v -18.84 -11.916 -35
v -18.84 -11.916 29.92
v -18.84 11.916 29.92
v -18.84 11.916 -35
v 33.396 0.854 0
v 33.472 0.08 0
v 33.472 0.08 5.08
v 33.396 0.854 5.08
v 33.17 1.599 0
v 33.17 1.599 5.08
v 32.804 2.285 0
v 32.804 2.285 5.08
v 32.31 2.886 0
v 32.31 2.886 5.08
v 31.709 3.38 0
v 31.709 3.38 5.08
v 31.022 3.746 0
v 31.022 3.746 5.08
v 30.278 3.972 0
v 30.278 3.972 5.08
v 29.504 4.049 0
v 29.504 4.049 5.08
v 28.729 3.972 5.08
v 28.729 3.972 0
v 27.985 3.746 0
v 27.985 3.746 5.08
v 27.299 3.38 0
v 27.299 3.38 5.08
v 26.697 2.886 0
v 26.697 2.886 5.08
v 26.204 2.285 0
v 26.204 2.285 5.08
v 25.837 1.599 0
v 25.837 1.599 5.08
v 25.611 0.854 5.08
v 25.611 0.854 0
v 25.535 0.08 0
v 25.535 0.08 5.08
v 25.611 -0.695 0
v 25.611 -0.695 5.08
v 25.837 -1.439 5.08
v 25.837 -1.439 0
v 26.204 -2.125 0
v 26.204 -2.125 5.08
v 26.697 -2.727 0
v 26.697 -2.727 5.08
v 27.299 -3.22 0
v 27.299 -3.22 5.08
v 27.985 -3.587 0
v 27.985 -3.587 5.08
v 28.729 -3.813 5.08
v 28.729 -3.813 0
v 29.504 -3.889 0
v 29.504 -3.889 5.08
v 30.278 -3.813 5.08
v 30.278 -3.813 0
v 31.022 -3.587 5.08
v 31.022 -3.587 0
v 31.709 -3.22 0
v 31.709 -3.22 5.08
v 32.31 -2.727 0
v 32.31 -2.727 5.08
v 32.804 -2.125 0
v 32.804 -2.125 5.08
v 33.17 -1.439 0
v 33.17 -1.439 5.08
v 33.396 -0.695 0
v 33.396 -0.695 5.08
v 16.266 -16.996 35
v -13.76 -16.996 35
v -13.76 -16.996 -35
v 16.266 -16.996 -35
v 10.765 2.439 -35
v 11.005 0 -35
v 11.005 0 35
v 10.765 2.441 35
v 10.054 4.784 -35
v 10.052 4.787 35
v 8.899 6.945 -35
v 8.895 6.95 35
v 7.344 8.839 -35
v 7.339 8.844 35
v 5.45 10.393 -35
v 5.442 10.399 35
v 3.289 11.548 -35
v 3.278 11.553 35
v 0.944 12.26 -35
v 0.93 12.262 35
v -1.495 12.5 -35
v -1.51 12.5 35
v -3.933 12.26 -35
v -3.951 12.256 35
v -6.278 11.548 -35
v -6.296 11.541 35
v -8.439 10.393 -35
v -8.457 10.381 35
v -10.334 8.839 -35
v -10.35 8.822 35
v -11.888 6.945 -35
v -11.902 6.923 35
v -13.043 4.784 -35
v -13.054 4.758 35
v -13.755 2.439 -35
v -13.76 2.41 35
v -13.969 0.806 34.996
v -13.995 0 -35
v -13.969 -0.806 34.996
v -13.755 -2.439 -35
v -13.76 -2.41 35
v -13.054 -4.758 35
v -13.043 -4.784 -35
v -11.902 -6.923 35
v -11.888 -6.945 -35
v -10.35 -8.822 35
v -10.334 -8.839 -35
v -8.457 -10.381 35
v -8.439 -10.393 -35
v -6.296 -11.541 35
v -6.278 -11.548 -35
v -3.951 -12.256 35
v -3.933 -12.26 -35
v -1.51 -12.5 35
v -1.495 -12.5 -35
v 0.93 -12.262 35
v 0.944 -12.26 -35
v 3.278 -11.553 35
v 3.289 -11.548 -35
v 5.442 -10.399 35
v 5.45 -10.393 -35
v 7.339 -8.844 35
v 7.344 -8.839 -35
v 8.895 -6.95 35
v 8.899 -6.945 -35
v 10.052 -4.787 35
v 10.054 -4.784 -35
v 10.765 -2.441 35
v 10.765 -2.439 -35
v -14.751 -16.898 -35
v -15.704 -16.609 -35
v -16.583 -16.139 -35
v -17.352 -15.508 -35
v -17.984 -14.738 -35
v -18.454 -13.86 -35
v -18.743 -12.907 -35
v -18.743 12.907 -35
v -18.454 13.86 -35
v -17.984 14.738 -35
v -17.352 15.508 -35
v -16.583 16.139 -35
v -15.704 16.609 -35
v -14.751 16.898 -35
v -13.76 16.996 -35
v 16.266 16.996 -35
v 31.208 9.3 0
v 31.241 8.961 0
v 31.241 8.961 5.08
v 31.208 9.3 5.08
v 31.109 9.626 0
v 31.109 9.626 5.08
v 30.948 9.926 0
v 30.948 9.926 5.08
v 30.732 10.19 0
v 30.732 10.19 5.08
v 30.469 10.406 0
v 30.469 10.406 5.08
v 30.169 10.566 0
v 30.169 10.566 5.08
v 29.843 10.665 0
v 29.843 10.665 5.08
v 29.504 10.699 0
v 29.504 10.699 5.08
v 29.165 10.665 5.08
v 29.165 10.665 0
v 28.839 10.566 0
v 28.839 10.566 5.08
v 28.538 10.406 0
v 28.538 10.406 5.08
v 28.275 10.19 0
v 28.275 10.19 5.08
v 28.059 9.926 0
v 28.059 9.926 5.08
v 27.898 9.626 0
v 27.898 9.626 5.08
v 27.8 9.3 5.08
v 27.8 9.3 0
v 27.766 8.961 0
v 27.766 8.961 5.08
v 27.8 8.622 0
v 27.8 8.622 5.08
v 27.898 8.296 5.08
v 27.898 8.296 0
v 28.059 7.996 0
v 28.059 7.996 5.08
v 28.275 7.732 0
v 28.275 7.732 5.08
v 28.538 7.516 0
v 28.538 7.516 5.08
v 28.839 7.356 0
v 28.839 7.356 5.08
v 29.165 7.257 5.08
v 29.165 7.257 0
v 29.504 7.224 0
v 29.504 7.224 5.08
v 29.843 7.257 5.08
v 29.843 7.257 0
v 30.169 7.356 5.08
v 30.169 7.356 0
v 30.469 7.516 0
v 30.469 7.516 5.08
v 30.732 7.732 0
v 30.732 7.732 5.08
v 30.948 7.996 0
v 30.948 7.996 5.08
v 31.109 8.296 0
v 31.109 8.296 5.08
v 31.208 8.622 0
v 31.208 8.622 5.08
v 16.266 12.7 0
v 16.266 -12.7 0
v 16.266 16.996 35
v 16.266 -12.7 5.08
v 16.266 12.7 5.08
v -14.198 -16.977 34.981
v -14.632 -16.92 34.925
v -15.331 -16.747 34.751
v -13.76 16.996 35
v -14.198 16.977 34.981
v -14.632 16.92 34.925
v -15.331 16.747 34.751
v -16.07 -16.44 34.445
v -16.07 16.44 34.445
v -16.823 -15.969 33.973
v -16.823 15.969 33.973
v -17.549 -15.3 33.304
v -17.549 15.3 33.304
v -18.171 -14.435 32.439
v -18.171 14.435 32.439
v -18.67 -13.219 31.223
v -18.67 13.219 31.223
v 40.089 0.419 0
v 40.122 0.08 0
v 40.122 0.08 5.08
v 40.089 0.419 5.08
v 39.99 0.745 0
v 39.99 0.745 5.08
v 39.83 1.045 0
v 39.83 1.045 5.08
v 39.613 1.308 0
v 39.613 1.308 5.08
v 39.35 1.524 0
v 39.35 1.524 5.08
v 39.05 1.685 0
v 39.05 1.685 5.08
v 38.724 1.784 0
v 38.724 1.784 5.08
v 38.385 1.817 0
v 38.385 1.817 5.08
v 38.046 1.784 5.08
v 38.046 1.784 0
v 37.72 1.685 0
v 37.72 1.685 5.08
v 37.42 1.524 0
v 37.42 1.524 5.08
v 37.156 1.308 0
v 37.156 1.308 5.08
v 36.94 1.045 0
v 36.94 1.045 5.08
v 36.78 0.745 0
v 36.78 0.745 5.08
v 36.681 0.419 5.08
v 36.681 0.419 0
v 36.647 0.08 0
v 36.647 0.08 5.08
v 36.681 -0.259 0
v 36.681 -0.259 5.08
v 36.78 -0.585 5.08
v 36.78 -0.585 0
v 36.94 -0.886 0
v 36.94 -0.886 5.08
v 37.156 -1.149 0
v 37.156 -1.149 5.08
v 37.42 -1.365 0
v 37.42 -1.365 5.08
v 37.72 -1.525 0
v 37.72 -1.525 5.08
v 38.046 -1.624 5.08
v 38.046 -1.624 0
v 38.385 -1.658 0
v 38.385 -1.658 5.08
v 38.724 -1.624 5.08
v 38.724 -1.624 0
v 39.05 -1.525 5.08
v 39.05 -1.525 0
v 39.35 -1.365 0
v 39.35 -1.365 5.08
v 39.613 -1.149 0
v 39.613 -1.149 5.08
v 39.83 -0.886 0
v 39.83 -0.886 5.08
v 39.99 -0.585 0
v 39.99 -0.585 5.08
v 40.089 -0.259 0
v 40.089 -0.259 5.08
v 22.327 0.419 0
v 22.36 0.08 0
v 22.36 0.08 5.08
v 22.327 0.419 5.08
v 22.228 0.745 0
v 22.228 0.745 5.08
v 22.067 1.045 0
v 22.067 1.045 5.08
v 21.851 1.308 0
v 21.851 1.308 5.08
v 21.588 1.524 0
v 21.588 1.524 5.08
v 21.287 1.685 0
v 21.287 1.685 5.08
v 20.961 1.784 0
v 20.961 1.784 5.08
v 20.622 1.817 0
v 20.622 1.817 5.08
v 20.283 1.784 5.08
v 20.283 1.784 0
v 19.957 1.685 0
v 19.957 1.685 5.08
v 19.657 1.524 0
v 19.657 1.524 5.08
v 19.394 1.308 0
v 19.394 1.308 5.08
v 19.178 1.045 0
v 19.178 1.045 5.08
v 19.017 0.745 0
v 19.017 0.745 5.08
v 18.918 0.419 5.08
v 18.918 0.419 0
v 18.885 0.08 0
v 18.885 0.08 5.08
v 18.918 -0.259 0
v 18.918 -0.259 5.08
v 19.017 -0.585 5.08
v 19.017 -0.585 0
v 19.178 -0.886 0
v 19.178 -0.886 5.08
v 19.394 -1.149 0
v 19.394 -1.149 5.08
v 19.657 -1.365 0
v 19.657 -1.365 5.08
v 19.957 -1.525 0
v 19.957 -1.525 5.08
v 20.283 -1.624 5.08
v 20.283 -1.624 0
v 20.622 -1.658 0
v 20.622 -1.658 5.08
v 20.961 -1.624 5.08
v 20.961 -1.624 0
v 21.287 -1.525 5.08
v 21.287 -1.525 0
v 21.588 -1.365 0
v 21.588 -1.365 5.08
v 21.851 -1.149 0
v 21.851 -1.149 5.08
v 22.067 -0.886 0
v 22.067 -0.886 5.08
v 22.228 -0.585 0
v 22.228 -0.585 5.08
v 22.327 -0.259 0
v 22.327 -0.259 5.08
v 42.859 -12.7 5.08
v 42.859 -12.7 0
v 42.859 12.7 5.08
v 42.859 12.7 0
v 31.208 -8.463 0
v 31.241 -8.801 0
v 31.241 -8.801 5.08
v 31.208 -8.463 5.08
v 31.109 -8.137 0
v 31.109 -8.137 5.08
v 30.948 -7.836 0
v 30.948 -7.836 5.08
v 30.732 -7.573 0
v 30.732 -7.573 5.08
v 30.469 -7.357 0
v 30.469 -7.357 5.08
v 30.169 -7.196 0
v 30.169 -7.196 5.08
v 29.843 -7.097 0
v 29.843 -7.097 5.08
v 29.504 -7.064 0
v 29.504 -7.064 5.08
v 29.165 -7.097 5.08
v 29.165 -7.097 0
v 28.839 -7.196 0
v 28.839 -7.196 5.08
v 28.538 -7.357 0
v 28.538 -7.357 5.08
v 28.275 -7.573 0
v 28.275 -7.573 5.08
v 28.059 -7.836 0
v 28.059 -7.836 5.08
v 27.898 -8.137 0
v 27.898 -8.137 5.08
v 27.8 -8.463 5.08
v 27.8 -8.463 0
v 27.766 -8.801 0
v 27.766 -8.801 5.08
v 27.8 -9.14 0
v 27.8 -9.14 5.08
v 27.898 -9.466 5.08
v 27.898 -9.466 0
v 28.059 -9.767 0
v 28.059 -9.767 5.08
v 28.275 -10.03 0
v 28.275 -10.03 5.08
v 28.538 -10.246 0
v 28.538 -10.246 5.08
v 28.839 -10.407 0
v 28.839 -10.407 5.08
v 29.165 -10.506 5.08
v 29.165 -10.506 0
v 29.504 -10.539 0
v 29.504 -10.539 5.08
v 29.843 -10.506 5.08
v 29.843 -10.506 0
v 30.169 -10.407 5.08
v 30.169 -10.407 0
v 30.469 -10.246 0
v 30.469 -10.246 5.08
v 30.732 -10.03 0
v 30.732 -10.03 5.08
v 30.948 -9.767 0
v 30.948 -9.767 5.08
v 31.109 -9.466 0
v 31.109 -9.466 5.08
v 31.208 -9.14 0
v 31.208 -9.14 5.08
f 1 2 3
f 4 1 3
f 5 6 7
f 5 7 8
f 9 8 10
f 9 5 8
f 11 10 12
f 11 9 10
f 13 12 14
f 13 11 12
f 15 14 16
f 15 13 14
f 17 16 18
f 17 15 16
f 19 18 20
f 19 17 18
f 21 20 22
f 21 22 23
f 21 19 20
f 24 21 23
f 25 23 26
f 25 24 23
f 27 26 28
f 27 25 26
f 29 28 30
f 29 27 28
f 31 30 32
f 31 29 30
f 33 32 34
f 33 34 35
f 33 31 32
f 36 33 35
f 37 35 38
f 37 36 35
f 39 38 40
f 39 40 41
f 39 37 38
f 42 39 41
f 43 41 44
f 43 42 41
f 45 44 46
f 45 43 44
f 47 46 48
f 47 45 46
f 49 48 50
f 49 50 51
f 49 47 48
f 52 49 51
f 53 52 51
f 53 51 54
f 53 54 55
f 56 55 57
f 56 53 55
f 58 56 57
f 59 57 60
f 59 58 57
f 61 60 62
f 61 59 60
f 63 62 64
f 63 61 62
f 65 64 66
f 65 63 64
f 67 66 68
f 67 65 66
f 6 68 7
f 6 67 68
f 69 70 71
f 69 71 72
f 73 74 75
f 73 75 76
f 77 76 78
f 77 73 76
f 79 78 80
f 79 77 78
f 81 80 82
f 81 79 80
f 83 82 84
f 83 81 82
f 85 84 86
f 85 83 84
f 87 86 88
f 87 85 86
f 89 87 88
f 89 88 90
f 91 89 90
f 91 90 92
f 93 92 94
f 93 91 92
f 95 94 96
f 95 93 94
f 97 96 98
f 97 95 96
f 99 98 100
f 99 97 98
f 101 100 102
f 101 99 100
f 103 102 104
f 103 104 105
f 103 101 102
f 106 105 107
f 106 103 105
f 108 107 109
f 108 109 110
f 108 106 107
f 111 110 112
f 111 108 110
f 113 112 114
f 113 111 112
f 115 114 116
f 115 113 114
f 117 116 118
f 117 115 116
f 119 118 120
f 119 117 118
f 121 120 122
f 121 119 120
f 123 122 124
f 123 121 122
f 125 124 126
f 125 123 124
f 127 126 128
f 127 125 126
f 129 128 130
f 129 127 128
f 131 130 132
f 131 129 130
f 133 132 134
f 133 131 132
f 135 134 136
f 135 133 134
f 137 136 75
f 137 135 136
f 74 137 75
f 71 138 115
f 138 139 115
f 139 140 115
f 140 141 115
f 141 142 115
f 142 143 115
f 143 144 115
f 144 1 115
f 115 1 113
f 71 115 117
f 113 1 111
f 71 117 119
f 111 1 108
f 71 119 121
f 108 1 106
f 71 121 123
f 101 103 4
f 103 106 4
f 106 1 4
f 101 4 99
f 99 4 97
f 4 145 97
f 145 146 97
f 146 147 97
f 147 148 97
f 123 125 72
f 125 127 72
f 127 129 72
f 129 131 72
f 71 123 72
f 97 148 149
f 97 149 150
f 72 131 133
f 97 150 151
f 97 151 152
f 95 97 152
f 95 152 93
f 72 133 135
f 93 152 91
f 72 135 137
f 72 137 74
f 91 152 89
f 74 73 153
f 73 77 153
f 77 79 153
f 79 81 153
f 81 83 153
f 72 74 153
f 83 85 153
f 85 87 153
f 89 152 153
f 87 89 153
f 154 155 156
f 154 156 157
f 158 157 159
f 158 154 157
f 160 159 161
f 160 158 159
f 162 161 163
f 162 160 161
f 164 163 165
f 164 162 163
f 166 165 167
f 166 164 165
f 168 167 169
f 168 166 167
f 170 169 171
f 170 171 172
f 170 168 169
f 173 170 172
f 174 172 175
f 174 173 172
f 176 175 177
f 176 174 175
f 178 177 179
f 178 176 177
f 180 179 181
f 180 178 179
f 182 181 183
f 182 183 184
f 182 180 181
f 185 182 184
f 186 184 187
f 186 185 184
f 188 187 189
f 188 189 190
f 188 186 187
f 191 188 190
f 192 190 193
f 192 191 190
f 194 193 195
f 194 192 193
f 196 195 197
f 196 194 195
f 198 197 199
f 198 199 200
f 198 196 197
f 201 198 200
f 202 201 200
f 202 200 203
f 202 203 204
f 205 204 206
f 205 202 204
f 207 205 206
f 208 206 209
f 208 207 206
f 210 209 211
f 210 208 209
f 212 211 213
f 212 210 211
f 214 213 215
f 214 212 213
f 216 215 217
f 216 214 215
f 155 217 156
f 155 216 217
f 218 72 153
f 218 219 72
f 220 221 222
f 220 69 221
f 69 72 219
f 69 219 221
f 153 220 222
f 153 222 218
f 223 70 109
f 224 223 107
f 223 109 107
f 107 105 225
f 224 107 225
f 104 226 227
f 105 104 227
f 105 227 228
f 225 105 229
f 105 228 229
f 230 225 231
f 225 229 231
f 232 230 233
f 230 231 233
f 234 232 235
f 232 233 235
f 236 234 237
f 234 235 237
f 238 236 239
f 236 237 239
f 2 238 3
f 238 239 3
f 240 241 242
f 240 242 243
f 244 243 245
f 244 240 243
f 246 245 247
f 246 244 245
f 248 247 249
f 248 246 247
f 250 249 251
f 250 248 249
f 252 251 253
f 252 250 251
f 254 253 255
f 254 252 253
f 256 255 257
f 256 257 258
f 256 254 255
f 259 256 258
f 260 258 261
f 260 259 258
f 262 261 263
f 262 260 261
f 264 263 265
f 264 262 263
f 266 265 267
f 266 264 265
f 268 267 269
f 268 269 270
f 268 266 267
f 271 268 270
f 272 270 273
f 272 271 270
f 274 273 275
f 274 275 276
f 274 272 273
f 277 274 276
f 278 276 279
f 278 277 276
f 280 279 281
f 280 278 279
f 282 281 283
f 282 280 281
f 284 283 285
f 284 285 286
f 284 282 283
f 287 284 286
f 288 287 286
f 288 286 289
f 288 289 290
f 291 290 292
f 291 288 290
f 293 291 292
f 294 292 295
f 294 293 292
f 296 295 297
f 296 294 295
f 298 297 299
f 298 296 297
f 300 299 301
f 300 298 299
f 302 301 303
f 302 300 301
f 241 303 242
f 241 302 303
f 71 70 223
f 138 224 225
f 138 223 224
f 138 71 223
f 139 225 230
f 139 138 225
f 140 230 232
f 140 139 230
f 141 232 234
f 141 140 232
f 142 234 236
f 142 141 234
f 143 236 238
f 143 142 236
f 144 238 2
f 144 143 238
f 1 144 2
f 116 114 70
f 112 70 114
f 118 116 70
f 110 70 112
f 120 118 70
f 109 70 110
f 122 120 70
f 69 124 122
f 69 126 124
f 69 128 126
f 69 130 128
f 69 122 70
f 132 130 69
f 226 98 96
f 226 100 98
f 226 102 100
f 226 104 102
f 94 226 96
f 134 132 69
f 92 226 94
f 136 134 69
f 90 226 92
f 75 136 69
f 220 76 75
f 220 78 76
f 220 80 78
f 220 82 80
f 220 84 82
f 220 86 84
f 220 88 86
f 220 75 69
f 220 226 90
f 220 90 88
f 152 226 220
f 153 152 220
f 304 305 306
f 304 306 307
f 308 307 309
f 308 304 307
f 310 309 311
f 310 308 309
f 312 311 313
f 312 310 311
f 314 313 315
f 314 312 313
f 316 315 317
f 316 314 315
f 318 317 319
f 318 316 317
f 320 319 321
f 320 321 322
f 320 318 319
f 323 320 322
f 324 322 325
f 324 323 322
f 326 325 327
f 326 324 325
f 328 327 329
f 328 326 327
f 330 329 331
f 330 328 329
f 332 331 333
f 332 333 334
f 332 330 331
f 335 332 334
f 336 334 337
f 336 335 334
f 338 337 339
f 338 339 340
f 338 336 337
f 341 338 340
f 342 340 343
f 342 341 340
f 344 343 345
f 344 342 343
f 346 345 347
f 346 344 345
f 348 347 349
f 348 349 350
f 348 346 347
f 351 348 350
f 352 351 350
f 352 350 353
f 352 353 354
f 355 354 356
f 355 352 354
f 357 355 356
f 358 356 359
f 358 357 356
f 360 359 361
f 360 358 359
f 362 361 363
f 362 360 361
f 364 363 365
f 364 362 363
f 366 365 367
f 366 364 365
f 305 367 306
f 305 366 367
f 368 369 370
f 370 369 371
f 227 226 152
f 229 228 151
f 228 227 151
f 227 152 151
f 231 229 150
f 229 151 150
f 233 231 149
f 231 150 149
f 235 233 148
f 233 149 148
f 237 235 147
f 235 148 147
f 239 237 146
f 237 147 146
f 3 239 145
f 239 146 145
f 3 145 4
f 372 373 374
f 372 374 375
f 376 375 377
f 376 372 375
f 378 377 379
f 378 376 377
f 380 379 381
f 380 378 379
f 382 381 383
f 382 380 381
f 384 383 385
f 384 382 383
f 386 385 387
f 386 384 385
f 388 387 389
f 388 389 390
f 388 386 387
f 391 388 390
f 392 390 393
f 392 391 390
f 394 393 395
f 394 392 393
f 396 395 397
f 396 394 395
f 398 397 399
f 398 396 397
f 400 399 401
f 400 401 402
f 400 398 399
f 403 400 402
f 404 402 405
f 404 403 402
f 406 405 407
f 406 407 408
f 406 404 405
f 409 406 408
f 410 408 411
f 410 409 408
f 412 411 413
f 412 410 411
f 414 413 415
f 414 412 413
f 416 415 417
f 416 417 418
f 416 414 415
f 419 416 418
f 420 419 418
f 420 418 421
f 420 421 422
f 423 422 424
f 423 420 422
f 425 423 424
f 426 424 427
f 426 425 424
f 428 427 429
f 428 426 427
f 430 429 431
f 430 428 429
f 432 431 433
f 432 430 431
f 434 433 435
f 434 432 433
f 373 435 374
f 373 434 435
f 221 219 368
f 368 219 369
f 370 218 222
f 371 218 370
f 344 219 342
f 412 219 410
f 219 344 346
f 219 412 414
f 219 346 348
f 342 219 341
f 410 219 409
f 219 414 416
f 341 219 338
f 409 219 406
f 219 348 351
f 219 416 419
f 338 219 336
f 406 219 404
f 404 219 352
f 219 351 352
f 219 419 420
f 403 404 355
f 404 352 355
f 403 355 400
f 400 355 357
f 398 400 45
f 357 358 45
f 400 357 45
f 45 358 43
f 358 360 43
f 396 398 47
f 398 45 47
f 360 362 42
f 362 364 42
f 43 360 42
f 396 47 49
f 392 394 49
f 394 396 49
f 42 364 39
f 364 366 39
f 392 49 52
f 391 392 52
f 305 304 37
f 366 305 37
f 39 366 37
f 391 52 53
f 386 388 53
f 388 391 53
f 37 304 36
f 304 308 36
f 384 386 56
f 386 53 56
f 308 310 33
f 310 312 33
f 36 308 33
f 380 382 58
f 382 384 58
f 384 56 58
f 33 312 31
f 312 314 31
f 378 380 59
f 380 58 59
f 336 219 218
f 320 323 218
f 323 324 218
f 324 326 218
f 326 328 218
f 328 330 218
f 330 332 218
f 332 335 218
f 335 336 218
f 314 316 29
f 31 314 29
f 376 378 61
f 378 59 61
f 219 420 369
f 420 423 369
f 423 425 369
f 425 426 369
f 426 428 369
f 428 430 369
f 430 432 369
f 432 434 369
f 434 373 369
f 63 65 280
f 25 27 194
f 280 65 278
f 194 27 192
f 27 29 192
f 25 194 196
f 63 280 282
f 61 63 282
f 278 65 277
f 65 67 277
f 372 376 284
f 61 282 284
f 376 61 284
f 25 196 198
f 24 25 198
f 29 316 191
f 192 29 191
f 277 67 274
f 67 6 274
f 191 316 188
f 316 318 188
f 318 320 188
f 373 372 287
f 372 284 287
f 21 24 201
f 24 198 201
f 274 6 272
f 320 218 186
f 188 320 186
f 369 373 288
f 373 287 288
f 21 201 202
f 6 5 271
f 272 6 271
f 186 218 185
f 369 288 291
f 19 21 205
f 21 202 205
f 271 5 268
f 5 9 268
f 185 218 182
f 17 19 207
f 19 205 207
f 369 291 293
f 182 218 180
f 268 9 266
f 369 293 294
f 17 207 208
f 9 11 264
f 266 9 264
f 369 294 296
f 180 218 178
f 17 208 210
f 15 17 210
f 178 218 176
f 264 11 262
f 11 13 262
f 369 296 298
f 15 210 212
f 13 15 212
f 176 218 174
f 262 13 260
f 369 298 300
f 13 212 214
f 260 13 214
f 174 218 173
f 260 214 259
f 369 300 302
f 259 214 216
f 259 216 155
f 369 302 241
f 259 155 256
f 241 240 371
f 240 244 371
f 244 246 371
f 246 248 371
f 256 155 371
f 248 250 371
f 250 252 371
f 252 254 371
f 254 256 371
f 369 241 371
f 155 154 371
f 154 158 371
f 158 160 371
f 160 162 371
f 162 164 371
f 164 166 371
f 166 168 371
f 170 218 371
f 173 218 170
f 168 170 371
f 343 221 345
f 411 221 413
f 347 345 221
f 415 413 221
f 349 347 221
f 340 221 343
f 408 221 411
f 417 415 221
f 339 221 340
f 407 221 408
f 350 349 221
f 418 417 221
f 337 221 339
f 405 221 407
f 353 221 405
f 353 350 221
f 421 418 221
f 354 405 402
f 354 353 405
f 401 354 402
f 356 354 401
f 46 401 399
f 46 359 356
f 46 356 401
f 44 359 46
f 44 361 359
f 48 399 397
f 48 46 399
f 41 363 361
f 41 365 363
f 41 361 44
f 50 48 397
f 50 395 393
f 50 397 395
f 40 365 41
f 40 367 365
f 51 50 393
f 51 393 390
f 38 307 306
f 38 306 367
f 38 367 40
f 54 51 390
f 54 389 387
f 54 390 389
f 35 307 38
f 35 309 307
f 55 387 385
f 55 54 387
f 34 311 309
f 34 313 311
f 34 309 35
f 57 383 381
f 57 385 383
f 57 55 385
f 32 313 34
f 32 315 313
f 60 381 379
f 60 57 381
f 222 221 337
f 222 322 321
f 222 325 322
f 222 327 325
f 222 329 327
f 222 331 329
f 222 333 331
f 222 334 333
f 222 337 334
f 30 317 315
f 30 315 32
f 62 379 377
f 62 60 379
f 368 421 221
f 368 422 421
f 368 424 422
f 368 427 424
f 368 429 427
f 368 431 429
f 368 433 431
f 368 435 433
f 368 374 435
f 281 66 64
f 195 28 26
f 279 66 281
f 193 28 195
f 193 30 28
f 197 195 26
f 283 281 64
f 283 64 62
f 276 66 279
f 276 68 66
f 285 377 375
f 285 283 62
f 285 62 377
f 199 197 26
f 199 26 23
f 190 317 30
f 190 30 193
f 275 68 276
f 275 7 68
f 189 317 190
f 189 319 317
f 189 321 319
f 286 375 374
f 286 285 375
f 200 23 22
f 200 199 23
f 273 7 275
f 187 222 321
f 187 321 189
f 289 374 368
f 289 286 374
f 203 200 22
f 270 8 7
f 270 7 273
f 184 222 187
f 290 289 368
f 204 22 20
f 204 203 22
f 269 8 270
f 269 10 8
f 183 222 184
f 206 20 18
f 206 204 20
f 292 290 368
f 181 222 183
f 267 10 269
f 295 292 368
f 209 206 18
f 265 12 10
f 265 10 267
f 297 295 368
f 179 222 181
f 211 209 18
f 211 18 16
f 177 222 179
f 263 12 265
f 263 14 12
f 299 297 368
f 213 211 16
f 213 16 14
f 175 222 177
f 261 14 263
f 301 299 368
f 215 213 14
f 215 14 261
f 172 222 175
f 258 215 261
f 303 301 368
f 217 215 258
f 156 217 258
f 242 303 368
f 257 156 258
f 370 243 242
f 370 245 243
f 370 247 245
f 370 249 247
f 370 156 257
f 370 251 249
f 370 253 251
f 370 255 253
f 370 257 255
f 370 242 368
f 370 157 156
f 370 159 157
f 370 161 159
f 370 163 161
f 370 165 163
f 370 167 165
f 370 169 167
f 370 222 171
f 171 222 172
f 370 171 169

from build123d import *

# Parameters (mm, degrees)
F0_W        = 28.7667152895
F0_H        = 25.4
F0_R        = 1.7375
F0_R_2      = 3.96875
F1_DEPTH    = 5.08
F2_W        = 35.1060024381
F2_H        = 33.9911315718
F2_R        = 12.5
F3_DEPTH    = 35
F4_T1_DEPTH = 59.3911315718
F4_T3_DEPTH = 95.4


# Not quite as in the source:
# - a fillet or chamfer that OpenCascade refuses, or shapes differently, is made with other operations: its cross-section is extruded or revolved along the edge and cut away or added
# - a feature names something its author has since deleted; it is built from what else it names


with BuildPart() as f1:
    # F0 (on Top) → F1 (new body)
    with BuildSketch(Plane.XY):
        with Locations((28.4760861403, 0)):
            Rectangle(F0_W, F0_H)
        with Locations((29.5036397874, -8.8014880077)):
            Circle(F0_R, mode=Mode.SUBTRACT)
        with Locations((20.6223897874, 0.0797619923)):
            Circle(F0_R, mode=Mode.SUBTRACT)
        with Locations((29.5036397874, 0.0797619923)):
            Circle(F0_R_2, mode=Mode.SUBTRACT)
        with Locations((38.3848897874, 0.0797619923)):
            Circle(F0_R, mode=Mode.SUBTRACT)
        with Locations((29.5036397874, 8.9610119923)):
            Circle(F0_R, mode=Mode.SUBTRACT)
    extrude(amount=F1_DEPTH)

    # F2 (on Top) → F3 (join, symmetric)
    with BuildSketch(Plane.XY):
        with Locations((-1.2872326612, 0)):
            Rectangle(F2_W, F2_H)
        with Locations((-1.4946922893, 0)):
            Circle(F2_R, mode=Mode.SUBTRACT)
    extrude(amount=F3_DEPTH, both=True)

    # F4: fillet of radius 5.08 on 3 edges, made by hand

    # F4_s2 → F4_t1 (cut)
    with BuildSketch(Plane.XZ.offset(-29.6955657859)):
        with BuildLine():
            ThreePointArc((-13.7602338803, 35), (-17.3523363287, 33.5121024484), (-18.8402338803, 29.92))
            Line((-18.8402338803, 29.92), (-18.8402338803, 35))
            Line((-18.8402338803, 35), (-13.7602338803, 35))
        make_face()
    extrude(amount=F4_T1_DEPTH, mode=Mode.SUBTRACT)

    # F4_s4 → F4_t3 (cut)
    with BuildSketch(Plane.XY.offset(-47.7)):
        with BuildLine():
            ThreePointArc((-13.7602338803, -16.9955657859), (-17.3523363287, -15.5076682343), (-18.8402338803, -11.9155657859))
            Line((-18.8402338803, -11.9155657859), (-18.8402338803, -16.9955657859))
            Line((-18.8402338803, -16.9955657859), (-13.7602338803, -16.9955657859))
        make_face()
        with BuildLine():
            ThreePointArc((-13.7602338803, 16.9955657859), (-17.3523363287, 15.5076682343), (-18.8402338803, 11.9155657859))
            Line((-18.8402338803, 11.9155657859), (-18.8402338803, 16.9955657859))
            Line((-18.8402338803, 16.9955657859), (-13.7602338803, 16.9955657859))
        make_face()
    extrude(amount=F4_T3_DEPTH, mode=Mode.SUBTRACT)


solid = f1.part
